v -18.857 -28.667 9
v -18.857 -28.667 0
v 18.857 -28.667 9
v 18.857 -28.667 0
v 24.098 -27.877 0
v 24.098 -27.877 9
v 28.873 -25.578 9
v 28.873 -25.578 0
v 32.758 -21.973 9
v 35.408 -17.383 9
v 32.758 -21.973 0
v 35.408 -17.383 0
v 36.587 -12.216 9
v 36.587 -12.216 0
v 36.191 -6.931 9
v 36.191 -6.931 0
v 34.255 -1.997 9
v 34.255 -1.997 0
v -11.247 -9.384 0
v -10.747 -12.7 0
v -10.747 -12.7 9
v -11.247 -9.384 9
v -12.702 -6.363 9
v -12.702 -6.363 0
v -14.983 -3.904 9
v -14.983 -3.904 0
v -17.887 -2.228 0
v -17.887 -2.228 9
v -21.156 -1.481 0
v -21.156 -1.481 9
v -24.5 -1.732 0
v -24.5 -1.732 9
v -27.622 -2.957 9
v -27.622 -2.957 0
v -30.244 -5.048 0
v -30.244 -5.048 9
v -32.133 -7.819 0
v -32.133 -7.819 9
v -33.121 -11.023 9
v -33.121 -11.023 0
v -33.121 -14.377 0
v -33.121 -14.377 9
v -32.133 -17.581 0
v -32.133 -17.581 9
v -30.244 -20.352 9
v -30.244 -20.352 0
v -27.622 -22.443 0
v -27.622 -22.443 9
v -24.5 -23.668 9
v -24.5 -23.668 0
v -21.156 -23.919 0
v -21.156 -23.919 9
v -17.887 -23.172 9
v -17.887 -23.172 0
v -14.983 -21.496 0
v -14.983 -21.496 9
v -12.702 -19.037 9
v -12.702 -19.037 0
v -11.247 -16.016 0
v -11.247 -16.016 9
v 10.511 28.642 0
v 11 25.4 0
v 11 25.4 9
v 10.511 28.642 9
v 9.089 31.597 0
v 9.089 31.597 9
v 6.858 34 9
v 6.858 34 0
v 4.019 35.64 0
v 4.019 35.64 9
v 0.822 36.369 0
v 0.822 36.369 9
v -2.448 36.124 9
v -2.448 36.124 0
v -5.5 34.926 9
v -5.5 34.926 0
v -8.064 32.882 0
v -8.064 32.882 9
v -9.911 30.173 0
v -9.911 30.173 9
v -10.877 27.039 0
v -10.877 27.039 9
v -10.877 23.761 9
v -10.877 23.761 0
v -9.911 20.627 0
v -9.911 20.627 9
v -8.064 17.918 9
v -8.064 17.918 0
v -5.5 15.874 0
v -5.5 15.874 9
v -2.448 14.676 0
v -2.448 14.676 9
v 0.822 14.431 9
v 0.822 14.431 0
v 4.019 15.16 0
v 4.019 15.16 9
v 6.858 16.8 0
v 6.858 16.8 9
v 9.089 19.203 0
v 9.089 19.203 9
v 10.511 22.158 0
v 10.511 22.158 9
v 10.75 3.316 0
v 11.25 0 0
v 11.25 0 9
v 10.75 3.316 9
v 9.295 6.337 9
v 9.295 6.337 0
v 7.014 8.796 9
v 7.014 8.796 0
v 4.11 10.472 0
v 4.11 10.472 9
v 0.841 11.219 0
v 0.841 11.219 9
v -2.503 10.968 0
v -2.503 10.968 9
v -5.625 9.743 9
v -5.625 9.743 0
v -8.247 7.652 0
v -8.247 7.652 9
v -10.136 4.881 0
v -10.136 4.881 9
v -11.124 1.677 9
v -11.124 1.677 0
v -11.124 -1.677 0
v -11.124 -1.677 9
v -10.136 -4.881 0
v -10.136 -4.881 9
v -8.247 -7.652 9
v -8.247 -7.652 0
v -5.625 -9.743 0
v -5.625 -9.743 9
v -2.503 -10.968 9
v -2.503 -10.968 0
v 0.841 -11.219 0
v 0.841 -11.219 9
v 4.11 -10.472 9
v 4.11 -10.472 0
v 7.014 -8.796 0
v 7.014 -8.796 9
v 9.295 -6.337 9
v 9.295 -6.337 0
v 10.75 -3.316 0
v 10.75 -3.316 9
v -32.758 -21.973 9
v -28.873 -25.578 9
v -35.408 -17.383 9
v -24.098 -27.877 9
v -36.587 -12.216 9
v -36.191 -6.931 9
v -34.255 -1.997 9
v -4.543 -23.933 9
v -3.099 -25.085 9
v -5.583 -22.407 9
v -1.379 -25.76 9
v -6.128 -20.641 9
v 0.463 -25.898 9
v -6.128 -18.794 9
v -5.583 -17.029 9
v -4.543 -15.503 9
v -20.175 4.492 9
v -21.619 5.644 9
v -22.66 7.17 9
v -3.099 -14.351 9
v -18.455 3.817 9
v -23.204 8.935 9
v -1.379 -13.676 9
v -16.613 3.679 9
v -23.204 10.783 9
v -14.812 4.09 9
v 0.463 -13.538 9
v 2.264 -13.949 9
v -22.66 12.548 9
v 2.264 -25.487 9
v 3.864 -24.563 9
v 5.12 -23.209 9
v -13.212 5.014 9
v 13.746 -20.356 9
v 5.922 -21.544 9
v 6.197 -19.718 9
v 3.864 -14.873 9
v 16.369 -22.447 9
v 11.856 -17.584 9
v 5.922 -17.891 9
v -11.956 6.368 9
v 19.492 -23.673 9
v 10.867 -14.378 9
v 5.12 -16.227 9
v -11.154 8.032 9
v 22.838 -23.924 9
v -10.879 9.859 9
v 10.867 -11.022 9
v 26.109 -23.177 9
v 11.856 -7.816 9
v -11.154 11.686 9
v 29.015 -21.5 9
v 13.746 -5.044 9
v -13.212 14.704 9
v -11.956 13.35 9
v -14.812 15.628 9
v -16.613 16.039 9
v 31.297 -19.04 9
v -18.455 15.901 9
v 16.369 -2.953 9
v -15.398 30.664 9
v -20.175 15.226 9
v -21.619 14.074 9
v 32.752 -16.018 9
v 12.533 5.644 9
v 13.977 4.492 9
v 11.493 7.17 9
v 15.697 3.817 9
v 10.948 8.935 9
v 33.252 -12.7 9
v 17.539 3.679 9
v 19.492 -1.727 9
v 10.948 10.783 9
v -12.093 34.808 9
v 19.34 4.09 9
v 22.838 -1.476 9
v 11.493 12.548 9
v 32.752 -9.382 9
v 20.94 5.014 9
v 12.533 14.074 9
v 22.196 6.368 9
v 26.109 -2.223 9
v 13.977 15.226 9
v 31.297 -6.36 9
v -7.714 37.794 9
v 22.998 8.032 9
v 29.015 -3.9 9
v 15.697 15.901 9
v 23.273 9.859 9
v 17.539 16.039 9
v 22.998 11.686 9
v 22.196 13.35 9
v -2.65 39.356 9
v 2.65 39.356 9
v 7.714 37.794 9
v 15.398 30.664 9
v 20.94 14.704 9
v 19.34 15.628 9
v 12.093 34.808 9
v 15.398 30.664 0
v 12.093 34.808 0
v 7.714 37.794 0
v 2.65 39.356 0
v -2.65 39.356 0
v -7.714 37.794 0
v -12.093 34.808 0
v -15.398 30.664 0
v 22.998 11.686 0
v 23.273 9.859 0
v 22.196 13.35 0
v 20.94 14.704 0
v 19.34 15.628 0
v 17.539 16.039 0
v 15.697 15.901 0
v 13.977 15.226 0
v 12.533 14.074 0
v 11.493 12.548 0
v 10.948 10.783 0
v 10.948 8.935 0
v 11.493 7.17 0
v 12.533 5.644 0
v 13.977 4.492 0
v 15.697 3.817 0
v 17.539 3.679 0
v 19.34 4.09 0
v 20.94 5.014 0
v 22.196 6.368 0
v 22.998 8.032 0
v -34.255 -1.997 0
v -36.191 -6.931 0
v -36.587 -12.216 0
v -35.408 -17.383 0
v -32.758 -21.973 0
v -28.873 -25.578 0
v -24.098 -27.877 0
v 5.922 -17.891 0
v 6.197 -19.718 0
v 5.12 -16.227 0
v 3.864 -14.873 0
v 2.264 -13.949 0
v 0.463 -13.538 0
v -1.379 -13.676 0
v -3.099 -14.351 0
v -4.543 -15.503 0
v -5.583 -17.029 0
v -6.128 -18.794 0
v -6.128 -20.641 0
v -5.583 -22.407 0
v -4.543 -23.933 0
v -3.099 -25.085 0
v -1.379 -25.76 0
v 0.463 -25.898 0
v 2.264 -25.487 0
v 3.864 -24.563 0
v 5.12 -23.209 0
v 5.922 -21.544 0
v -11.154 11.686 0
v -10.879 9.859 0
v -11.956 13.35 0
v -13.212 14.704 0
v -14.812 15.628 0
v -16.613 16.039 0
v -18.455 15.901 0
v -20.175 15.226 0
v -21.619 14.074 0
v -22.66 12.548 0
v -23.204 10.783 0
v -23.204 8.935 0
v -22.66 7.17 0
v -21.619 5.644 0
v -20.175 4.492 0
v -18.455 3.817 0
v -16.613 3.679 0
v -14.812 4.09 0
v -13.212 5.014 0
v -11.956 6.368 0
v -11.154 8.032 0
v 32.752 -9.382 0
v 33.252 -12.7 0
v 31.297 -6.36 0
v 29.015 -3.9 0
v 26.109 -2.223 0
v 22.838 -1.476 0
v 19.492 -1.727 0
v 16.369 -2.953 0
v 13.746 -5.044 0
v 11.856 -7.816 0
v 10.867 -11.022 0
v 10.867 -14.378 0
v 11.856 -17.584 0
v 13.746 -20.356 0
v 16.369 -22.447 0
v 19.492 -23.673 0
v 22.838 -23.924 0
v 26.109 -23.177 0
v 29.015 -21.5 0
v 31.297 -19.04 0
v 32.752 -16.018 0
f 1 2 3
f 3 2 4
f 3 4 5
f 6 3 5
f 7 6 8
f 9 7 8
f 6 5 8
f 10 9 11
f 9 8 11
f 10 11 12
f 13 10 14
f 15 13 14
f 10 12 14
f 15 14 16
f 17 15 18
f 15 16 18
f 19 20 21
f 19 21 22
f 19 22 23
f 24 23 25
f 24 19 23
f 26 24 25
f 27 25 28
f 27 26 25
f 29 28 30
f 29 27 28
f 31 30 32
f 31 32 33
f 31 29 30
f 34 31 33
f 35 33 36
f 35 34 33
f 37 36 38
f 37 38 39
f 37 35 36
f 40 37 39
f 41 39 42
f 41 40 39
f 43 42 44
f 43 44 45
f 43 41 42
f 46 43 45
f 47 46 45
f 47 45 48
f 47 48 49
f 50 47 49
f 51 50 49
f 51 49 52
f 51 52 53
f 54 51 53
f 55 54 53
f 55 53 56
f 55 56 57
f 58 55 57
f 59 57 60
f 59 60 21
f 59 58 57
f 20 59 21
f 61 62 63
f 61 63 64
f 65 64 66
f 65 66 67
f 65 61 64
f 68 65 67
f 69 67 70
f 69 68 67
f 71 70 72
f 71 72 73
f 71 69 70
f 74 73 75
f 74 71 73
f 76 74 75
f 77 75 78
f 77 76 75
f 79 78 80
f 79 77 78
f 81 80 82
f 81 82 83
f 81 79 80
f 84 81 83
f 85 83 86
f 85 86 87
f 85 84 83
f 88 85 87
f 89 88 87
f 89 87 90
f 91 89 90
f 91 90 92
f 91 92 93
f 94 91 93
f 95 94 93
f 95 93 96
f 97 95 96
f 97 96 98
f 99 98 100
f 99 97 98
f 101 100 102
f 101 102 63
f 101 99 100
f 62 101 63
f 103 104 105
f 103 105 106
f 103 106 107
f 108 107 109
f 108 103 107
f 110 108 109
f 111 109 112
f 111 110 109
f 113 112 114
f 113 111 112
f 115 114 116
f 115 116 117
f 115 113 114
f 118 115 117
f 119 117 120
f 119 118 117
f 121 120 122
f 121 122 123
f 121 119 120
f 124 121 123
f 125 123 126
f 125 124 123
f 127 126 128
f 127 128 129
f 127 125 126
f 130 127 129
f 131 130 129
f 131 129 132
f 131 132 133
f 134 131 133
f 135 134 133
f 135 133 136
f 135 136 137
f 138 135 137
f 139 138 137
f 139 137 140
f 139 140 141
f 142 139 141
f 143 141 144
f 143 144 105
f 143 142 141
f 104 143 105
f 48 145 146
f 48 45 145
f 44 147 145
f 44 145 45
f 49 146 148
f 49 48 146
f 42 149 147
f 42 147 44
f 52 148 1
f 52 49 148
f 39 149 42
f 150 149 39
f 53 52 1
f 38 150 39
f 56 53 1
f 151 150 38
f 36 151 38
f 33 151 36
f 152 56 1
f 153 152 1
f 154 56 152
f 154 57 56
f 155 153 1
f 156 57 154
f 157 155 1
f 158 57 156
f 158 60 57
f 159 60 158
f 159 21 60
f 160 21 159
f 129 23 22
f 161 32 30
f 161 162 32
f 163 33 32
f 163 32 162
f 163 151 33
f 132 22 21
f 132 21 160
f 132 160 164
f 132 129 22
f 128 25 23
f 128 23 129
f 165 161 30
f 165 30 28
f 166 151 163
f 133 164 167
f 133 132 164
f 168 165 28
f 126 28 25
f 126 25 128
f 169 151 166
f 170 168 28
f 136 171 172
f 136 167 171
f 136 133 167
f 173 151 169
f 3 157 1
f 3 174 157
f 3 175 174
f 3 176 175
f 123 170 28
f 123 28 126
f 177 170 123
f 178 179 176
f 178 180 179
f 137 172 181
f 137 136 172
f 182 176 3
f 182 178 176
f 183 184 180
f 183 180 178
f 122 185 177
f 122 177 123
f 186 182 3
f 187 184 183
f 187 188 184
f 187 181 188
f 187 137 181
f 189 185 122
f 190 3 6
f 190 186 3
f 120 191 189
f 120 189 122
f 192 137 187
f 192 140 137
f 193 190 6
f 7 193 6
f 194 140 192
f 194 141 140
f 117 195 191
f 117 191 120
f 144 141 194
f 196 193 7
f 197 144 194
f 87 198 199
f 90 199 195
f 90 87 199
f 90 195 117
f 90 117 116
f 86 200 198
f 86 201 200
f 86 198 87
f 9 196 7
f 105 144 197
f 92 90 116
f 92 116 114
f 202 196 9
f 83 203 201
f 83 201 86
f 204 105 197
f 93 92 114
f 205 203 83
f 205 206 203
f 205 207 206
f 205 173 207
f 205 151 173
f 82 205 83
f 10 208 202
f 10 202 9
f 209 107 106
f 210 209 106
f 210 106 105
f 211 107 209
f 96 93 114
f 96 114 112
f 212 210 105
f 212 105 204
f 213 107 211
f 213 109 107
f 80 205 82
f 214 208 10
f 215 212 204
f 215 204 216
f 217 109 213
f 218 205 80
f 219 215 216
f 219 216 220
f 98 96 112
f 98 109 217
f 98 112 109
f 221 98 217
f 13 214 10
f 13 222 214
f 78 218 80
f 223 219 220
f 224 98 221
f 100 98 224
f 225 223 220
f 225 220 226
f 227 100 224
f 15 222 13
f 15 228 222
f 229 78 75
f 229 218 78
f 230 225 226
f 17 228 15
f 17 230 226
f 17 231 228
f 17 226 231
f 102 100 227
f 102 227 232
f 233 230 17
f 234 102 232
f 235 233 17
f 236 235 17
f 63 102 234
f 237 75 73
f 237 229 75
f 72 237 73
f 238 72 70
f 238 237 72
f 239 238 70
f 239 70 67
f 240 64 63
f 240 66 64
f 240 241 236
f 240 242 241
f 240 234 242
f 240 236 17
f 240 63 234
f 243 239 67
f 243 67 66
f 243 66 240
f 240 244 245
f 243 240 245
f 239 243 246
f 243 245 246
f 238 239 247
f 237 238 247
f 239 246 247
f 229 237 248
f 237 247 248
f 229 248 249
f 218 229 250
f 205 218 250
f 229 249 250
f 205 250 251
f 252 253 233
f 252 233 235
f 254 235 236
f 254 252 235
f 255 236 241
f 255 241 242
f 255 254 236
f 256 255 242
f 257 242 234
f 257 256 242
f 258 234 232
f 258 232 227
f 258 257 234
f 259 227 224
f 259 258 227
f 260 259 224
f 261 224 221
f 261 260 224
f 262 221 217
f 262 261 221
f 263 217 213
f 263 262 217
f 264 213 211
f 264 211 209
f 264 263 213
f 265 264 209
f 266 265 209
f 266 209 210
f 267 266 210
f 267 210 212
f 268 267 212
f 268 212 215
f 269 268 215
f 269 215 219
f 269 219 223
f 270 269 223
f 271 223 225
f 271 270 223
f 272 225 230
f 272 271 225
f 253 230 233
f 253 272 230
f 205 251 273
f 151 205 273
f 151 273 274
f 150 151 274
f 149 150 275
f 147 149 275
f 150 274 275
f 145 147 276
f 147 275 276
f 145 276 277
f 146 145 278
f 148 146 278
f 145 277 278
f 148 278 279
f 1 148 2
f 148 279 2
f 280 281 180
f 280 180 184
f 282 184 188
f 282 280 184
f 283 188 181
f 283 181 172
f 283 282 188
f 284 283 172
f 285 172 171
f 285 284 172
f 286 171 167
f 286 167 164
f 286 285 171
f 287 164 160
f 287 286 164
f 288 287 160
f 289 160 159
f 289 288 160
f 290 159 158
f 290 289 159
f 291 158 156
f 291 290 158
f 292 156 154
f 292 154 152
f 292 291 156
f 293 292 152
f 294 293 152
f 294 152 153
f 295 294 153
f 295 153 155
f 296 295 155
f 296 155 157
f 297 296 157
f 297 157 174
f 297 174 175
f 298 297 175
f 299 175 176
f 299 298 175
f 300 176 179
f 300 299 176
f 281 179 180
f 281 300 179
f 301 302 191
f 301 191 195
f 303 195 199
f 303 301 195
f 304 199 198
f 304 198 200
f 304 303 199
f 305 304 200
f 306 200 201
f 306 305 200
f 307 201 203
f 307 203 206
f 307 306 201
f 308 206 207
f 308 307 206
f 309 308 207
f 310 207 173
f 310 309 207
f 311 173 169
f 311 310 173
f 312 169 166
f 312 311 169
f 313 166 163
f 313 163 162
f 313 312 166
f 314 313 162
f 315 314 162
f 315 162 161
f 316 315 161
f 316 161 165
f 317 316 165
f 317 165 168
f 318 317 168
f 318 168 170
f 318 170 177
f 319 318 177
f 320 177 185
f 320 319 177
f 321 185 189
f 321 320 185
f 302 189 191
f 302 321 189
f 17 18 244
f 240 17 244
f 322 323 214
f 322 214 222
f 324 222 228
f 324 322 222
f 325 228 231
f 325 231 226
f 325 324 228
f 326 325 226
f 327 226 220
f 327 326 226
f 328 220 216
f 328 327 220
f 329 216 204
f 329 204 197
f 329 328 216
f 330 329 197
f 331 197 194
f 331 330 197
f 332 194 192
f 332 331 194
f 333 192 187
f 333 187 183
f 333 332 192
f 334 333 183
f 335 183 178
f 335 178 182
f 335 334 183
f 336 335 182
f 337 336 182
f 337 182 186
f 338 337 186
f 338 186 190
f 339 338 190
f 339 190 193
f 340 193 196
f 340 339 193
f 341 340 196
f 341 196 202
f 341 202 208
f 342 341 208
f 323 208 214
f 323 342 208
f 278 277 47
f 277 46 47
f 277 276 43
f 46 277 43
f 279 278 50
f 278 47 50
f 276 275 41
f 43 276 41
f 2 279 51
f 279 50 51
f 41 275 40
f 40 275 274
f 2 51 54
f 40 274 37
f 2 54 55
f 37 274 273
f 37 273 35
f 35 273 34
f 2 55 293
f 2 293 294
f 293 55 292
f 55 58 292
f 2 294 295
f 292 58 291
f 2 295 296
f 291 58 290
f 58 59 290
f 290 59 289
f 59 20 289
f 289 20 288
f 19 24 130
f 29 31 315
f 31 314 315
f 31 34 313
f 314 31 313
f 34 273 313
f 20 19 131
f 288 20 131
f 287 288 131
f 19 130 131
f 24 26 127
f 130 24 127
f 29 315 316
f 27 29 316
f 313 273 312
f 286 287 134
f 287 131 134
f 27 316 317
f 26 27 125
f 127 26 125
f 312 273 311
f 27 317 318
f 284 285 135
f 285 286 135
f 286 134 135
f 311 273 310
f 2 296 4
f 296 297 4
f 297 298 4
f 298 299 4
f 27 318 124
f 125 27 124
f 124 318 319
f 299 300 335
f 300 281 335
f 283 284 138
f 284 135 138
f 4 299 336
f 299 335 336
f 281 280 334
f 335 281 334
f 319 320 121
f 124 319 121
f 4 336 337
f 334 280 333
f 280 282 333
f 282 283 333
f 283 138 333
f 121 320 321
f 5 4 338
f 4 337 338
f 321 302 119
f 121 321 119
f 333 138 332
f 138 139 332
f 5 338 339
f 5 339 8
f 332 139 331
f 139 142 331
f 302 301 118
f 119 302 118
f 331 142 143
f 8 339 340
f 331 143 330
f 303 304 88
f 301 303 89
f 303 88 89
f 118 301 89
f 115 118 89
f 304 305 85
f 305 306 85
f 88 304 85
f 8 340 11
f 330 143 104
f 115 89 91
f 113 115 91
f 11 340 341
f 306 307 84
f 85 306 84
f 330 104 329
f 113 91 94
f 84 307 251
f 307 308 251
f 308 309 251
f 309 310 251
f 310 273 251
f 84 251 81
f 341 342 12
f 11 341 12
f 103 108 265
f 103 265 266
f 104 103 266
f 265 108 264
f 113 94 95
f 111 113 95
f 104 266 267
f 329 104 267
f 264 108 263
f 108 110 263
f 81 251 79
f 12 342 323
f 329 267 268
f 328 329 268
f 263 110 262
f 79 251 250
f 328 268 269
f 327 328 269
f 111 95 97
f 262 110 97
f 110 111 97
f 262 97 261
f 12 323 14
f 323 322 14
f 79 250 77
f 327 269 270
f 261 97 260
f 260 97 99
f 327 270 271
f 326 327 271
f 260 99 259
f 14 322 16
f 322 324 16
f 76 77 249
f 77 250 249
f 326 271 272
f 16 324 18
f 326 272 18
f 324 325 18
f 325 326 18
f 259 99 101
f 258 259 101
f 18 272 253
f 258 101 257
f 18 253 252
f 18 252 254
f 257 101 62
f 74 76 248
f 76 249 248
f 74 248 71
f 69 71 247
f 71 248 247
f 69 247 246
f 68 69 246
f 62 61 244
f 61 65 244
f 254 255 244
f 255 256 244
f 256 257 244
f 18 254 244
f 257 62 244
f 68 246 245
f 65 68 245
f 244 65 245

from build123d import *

# Parameters (mm, degrees)
F0_R     = 11.25
F0_R_2   = 6.197174
F0_R_3   = 11.255413
F0_R_4   = 11
F1_DEPTH = 9


with BuildPart() as f1:
    # F0 (on Top) → F1 (new body)
    with BuildSketch(Plane.XY):
        with BuildLine():
            Line((-18.857145, -28.667178), (18.857145, -28.667178))
            ThreePointArc((18.857145, -28.667178), (34.255077, -19.777178), (34.255077, -1.997178))
            Line((34.255077, -1.997178), (15.397932, 30.664356))
            ThreePointArc((15.397932, 30.664356), (0, 39.554356), (-15.397932, 30.664356))
            Line((-15.397932, 30.664356), (-34.255077, -1.997178))
            ThreePointArc((-34.255077, -1.997178), (-34.255077, -19.777178), (-18.857145, -28.667178))
        make_face()
        with Locations((-21.997045, -12.7)):
            Circle(F0_R, mode=Mode.SUBTRACT)
        with Locations((0, -19.717751)):
            Circle(F0_R_2, mode=Mode.SUBTRACT)
        Circle(F0_R, mode=Mode.SUBTRACT)
        with Locations((21.997045, -12.7)):
            Circle(F0_R_3, mode=Mode.SUBTRACT)
        with Locations((-17.076073, 9.858875)):
            Circle(F0_R_2, mode=Mode.SUBTRACT)
        with Locations((0, 25.4)):
            Circle(F0_R_4, mode=Mode.SUBTRACT)
        with Locations((17.076073, 9.858875)):
            Circle(F0_R_2, mode=Mode.SUBTRACT)
    extrude(amount=F1_DEPTH)


solid = f1.part
